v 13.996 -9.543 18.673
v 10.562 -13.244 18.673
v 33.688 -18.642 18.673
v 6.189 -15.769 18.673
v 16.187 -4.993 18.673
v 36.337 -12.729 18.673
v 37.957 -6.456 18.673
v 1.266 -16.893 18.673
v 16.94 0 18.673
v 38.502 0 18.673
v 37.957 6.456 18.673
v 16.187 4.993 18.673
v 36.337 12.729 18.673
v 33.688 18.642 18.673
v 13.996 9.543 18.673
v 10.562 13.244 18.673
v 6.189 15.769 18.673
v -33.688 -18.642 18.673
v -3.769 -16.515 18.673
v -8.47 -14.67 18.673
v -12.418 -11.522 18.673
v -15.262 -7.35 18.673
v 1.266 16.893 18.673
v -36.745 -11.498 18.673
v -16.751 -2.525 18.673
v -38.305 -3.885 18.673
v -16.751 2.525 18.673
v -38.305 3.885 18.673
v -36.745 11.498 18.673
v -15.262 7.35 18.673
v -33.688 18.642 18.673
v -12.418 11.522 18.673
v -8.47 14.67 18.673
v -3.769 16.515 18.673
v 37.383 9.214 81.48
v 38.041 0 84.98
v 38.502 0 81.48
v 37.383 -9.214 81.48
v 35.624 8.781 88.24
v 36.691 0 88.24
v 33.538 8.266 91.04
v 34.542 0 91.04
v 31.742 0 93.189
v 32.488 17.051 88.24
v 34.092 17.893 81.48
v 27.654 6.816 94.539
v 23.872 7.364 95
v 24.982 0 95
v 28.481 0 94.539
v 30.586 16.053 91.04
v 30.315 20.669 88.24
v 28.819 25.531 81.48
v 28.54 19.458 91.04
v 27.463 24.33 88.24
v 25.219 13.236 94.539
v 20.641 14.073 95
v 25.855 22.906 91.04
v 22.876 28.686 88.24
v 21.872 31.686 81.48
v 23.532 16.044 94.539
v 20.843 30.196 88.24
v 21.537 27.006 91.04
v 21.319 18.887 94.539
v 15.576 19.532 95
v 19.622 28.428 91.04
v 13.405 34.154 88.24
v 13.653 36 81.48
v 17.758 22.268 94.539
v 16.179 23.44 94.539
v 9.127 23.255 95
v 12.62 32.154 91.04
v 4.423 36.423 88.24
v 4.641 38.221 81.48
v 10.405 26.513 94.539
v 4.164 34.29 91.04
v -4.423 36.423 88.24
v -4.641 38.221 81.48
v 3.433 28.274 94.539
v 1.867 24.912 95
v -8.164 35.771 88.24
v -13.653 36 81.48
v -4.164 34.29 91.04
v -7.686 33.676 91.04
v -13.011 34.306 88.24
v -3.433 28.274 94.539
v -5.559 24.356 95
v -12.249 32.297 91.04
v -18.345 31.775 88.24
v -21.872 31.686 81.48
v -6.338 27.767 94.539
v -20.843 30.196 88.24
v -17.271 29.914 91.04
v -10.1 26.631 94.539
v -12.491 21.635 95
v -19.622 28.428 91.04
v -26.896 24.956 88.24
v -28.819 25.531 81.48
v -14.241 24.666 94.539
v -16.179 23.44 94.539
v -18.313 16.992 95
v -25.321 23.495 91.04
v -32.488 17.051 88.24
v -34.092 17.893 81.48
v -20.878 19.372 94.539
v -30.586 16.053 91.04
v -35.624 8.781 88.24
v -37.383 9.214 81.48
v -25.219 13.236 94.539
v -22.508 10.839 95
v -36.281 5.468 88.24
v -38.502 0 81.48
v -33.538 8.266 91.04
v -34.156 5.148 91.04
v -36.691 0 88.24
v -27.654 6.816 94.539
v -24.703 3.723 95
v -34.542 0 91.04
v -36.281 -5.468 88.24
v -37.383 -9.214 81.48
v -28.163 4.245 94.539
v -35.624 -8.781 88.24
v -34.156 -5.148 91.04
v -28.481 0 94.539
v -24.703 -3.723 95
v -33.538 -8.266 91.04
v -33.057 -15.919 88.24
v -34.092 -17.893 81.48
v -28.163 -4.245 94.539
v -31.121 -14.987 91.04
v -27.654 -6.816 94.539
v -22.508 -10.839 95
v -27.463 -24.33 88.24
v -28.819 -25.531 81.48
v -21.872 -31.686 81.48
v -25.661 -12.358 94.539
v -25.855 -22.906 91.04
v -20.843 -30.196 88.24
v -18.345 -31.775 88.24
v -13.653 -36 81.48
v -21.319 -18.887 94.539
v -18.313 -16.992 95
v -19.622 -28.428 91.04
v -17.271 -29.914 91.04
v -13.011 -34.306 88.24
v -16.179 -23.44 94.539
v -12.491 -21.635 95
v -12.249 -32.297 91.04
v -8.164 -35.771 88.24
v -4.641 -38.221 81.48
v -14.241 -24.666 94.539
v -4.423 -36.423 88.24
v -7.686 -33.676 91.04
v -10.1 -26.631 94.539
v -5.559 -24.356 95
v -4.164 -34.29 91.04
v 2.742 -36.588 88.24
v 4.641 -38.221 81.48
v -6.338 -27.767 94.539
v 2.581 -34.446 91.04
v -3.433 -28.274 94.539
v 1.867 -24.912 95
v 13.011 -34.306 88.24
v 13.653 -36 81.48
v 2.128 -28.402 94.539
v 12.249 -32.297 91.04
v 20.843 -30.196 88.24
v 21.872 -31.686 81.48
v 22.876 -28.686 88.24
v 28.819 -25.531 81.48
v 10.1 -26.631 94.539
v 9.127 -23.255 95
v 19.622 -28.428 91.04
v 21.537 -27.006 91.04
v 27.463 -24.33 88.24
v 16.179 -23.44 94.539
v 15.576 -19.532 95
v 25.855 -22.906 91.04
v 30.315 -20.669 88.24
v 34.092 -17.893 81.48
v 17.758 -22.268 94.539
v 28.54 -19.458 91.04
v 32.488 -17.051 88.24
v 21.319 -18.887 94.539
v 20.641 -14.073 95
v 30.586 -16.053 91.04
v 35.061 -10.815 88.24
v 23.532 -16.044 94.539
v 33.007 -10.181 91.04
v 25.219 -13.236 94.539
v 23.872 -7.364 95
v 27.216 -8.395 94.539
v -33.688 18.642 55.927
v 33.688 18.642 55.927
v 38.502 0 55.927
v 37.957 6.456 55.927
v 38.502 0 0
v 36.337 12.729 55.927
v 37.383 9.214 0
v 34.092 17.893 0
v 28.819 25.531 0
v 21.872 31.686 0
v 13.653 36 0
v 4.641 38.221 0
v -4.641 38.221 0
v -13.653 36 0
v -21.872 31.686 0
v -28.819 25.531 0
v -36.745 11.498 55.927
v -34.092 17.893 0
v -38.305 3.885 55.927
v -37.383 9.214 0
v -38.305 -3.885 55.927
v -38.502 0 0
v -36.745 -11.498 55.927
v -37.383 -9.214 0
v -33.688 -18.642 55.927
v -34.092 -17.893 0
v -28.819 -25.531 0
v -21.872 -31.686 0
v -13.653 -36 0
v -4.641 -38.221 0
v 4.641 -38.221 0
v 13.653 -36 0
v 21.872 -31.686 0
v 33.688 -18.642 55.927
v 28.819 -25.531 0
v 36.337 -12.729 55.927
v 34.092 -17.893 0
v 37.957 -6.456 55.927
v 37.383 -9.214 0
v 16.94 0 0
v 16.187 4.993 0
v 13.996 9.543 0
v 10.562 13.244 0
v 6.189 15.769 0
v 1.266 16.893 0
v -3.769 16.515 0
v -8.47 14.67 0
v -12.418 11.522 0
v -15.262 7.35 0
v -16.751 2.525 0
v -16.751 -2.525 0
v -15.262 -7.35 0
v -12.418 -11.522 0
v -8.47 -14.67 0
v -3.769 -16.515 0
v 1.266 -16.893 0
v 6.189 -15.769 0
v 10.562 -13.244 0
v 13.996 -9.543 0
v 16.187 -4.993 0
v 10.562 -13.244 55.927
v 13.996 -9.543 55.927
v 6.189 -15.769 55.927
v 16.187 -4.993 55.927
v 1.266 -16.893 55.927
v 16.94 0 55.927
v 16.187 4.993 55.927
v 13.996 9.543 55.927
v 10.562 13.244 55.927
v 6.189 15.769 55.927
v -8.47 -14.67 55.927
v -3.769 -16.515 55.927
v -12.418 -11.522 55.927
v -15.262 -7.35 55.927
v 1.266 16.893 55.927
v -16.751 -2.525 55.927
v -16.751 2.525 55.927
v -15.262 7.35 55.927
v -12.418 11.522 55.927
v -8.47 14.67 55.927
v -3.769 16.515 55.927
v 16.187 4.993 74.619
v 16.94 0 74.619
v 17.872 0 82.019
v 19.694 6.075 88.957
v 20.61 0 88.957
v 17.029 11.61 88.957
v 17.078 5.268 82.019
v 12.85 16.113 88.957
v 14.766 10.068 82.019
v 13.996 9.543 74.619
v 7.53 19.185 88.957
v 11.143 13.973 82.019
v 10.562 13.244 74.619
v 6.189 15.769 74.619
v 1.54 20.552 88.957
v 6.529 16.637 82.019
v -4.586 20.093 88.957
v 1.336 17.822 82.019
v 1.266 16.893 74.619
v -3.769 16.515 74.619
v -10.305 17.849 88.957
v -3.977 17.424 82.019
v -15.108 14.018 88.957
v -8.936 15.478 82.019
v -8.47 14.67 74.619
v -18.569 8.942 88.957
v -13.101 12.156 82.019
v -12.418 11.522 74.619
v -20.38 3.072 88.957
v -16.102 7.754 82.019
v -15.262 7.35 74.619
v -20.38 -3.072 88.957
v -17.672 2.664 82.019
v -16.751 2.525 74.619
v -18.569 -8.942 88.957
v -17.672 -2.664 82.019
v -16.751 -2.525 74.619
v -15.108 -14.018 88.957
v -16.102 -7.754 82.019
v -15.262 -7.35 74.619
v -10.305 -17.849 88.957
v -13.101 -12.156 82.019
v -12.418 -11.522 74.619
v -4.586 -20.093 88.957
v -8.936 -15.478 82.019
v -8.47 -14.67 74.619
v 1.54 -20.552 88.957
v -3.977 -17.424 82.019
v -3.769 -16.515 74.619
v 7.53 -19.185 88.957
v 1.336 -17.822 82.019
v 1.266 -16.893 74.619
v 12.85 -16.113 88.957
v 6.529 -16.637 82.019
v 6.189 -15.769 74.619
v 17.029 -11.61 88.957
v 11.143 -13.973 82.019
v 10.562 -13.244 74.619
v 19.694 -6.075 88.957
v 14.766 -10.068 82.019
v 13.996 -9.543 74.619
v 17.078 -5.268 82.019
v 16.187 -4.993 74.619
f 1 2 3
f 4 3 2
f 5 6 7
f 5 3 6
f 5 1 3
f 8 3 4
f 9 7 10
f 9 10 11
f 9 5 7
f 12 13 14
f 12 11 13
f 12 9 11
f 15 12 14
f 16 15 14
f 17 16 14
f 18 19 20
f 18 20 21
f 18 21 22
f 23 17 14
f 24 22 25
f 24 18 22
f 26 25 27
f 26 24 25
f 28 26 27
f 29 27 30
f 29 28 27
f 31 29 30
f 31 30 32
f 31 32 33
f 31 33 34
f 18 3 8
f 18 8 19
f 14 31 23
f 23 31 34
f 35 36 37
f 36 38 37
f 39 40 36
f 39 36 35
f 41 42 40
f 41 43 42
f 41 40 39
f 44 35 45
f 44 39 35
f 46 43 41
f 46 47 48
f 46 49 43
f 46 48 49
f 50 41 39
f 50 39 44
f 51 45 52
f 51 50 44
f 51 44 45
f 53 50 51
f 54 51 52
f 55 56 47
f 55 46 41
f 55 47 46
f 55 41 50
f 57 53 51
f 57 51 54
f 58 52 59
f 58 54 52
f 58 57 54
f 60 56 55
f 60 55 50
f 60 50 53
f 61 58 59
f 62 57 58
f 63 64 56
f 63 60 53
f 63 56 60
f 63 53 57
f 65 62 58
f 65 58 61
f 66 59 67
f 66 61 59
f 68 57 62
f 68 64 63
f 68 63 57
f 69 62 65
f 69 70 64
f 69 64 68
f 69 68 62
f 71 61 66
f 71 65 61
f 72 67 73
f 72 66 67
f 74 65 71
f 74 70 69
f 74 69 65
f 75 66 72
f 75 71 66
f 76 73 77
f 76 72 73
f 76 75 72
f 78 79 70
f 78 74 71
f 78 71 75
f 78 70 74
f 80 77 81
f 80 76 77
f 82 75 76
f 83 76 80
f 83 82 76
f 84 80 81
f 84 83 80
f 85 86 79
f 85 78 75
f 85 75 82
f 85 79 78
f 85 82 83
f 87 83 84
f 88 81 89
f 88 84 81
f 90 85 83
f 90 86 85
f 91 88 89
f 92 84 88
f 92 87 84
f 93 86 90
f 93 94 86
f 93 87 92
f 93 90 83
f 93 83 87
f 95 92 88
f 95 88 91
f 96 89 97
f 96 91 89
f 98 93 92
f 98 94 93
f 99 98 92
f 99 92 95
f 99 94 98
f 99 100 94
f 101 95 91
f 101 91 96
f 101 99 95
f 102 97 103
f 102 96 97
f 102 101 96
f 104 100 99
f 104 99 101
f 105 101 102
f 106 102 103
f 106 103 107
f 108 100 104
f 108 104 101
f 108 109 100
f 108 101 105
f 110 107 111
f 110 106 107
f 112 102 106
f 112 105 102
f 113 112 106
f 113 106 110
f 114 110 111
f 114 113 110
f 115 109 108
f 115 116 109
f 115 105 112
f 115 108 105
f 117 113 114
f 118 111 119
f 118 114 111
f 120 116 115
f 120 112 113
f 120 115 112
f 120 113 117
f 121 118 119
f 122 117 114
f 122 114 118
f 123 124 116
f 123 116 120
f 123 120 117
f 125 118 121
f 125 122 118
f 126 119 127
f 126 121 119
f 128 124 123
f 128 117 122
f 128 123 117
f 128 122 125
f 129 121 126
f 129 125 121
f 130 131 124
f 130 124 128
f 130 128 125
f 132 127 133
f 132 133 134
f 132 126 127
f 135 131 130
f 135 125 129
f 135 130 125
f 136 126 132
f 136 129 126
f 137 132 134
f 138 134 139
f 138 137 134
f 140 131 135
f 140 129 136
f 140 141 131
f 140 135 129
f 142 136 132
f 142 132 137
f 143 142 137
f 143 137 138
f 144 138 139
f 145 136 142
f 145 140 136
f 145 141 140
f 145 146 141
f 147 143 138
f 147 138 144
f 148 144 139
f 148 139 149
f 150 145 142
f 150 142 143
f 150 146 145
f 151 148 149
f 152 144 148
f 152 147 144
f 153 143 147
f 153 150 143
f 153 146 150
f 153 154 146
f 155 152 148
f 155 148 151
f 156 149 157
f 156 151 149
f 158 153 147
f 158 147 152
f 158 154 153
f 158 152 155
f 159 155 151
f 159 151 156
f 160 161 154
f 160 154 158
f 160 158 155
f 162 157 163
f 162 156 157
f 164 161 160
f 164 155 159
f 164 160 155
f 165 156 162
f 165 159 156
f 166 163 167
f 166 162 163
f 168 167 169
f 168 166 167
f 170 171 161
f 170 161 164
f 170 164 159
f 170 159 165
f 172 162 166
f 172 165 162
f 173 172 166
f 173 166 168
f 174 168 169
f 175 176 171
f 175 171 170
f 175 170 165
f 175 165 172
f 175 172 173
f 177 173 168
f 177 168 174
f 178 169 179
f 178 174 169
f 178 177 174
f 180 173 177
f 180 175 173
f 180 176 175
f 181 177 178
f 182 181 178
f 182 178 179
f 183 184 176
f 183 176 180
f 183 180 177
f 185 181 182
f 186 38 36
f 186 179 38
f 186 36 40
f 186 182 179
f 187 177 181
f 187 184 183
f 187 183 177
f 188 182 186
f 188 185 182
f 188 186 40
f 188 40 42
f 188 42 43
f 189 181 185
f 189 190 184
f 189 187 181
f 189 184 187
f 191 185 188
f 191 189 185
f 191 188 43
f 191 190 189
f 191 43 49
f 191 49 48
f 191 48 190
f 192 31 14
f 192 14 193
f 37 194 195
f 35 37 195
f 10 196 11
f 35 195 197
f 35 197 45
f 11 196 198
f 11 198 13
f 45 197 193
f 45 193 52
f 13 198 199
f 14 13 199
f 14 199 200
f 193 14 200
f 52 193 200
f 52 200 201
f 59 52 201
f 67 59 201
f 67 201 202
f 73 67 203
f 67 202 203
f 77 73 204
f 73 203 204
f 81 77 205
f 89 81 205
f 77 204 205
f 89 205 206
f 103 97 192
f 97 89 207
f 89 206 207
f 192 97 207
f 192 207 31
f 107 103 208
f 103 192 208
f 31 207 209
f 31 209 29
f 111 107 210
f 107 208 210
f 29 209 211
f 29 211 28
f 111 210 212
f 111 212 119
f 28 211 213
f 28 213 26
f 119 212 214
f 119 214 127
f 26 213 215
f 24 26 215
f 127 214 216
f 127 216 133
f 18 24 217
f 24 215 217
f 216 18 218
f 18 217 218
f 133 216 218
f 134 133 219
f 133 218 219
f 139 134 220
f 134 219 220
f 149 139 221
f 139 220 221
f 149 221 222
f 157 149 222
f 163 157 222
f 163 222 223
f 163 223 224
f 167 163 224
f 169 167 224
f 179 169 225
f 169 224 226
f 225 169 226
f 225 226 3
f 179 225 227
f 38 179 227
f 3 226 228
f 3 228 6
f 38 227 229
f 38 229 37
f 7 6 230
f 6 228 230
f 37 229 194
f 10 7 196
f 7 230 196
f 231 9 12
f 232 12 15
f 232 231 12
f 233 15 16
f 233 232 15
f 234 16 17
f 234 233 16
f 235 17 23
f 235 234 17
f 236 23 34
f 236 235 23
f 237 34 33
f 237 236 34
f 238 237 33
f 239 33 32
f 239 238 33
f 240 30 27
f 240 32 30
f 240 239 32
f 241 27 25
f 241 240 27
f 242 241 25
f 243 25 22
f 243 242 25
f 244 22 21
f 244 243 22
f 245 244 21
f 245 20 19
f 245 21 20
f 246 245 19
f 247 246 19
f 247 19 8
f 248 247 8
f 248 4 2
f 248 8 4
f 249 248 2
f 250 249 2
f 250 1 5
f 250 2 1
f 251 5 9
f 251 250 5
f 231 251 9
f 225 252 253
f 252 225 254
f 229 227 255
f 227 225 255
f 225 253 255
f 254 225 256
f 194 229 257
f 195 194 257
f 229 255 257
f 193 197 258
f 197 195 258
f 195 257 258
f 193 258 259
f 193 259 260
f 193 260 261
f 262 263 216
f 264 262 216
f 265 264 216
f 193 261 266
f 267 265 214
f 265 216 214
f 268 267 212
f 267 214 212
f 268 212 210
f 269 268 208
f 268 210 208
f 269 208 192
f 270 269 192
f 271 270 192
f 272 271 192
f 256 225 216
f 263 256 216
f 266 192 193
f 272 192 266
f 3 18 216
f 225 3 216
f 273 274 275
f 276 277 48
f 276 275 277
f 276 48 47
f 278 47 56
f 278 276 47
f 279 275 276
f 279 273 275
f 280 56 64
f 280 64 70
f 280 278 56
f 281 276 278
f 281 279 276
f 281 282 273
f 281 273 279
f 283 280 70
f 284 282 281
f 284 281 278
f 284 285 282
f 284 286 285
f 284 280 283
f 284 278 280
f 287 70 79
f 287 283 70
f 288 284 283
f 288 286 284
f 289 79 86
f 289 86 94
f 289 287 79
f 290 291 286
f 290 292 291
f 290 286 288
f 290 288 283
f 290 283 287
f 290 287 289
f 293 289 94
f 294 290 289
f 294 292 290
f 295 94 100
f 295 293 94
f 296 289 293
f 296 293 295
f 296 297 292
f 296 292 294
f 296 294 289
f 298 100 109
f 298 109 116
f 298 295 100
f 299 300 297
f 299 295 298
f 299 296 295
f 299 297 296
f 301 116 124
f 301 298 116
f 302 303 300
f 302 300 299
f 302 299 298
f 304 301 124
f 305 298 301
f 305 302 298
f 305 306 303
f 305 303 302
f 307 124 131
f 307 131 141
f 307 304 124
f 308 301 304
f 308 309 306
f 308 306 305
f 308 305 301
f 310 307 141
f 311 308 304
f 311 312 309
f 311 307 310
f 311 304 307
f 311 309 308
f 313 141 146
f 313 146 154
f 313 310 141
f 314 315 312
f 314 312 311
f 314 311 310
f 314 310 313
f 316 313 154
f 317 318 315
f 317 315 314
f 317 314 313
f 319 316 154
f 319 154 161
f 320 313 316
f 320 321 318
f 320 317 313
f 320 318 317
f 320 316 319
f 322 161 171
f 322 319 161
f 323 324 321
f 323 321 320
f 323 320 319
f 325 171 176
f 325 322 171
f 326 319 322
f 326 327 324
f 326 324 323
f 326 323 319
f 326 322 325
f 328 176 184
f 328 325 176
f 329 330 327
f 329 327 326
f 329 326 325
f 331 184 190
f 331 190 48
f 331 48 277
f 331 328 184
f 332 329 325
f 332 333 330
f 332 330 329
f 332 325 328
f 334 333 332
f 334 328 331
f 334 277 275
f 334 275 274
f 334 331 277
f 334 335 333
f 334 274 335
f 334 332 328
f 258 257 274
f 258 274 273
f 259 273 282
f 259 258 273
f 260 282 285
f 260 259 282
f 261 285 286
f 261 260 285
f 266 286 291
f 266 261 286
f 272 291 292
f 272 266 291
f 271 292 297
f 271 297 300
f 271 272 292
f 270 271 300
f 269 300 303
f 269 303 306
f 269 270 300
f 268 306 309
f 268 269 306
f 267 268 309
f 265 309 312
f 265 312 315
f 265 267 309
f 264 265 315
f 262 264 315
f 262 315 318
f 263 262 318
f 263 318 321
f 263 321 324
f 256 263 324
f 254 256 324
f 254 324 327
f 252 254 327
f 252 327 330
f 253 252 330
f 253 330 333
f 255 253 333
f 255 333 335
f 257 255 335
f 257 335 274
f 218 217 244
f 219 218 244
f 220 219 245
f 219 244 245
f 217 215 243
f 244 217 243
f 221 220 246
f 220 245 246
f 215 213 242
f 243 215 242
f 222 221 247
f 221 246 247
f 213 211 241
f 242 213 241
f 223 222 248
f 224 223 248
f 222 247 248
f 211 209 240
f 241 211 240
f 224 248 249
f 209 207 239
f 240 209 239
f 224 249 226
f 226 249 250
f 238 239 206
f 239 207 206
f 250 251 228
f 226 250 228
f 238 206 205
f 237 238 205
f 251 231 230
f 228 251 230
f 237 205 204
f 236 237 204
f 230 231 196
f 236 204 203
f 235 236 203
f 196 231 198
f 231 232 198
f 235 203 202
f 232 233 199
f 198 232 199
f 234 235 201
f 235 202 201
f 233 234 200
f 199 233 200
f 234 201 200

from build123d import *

# Parameters (mm, degrees)
F0_R     = 38.5018988787
F0_R_2   = 16.939934048
F1_DEPTH = 95
F5_W     = 37.283
F5_H     = 37.253003633
F6_DEPTH = 100
F7_R     = 13.5195959493


# Not quite as in the source:
# - a fillet or chamfer that OpenCascade refuses, or shapes differently, is made with other operations: its cross-section is extruded or revolved along the edge and cut away or added


with BuildPart() as f1:
    # F0 (on Top) → F1 (new body)
    with BuildSketch(Plane.XY):
        Circle(F0_R)
        Circle(F0_R_2, mode=Mode.SUBTRACT)
    extrude(amount=F1_DEPTH)

    # F5 (on line) → F6 (cut)
    with BuildSketch(Plane.YZ.offset(-38.5018988787)):
        with Locations((0, 37.3)):
            Rectangle(F5_W, F5_H)
    extrude(amount=F6_DEPTH, mode=Mode.SUBTRACT)

    # F7
    f7_edges = [f1.edges().sort_by_distance(p)[0] for p in [
        (-38.501899, 0, 95),
    ]]
    fillet(f7_edges, radius=F7_R)

    # F8: fillet of radius 29.8468724241 on 1 edges, made by hand

    # F8_s1 → F8_t2 (revolve, cut)
    with BuildSketch(Plane.XZ):
        with BuildLine():
            ThreePointArc((24.9823029294, 95), (19.0232329538, 85.5740041188), (16.939934048, 74.6186502225))
            Line((16.939934048, 74.6186502225), (16.939934048, 95))
            Line((16.939934048, 95), (24.9823029294, 95))
        make_face()
    revolve(axis=Axis((0, 0, 95), (0, 0, 1)), mode=Mode.SUBTRACT)


solid = f1.part
